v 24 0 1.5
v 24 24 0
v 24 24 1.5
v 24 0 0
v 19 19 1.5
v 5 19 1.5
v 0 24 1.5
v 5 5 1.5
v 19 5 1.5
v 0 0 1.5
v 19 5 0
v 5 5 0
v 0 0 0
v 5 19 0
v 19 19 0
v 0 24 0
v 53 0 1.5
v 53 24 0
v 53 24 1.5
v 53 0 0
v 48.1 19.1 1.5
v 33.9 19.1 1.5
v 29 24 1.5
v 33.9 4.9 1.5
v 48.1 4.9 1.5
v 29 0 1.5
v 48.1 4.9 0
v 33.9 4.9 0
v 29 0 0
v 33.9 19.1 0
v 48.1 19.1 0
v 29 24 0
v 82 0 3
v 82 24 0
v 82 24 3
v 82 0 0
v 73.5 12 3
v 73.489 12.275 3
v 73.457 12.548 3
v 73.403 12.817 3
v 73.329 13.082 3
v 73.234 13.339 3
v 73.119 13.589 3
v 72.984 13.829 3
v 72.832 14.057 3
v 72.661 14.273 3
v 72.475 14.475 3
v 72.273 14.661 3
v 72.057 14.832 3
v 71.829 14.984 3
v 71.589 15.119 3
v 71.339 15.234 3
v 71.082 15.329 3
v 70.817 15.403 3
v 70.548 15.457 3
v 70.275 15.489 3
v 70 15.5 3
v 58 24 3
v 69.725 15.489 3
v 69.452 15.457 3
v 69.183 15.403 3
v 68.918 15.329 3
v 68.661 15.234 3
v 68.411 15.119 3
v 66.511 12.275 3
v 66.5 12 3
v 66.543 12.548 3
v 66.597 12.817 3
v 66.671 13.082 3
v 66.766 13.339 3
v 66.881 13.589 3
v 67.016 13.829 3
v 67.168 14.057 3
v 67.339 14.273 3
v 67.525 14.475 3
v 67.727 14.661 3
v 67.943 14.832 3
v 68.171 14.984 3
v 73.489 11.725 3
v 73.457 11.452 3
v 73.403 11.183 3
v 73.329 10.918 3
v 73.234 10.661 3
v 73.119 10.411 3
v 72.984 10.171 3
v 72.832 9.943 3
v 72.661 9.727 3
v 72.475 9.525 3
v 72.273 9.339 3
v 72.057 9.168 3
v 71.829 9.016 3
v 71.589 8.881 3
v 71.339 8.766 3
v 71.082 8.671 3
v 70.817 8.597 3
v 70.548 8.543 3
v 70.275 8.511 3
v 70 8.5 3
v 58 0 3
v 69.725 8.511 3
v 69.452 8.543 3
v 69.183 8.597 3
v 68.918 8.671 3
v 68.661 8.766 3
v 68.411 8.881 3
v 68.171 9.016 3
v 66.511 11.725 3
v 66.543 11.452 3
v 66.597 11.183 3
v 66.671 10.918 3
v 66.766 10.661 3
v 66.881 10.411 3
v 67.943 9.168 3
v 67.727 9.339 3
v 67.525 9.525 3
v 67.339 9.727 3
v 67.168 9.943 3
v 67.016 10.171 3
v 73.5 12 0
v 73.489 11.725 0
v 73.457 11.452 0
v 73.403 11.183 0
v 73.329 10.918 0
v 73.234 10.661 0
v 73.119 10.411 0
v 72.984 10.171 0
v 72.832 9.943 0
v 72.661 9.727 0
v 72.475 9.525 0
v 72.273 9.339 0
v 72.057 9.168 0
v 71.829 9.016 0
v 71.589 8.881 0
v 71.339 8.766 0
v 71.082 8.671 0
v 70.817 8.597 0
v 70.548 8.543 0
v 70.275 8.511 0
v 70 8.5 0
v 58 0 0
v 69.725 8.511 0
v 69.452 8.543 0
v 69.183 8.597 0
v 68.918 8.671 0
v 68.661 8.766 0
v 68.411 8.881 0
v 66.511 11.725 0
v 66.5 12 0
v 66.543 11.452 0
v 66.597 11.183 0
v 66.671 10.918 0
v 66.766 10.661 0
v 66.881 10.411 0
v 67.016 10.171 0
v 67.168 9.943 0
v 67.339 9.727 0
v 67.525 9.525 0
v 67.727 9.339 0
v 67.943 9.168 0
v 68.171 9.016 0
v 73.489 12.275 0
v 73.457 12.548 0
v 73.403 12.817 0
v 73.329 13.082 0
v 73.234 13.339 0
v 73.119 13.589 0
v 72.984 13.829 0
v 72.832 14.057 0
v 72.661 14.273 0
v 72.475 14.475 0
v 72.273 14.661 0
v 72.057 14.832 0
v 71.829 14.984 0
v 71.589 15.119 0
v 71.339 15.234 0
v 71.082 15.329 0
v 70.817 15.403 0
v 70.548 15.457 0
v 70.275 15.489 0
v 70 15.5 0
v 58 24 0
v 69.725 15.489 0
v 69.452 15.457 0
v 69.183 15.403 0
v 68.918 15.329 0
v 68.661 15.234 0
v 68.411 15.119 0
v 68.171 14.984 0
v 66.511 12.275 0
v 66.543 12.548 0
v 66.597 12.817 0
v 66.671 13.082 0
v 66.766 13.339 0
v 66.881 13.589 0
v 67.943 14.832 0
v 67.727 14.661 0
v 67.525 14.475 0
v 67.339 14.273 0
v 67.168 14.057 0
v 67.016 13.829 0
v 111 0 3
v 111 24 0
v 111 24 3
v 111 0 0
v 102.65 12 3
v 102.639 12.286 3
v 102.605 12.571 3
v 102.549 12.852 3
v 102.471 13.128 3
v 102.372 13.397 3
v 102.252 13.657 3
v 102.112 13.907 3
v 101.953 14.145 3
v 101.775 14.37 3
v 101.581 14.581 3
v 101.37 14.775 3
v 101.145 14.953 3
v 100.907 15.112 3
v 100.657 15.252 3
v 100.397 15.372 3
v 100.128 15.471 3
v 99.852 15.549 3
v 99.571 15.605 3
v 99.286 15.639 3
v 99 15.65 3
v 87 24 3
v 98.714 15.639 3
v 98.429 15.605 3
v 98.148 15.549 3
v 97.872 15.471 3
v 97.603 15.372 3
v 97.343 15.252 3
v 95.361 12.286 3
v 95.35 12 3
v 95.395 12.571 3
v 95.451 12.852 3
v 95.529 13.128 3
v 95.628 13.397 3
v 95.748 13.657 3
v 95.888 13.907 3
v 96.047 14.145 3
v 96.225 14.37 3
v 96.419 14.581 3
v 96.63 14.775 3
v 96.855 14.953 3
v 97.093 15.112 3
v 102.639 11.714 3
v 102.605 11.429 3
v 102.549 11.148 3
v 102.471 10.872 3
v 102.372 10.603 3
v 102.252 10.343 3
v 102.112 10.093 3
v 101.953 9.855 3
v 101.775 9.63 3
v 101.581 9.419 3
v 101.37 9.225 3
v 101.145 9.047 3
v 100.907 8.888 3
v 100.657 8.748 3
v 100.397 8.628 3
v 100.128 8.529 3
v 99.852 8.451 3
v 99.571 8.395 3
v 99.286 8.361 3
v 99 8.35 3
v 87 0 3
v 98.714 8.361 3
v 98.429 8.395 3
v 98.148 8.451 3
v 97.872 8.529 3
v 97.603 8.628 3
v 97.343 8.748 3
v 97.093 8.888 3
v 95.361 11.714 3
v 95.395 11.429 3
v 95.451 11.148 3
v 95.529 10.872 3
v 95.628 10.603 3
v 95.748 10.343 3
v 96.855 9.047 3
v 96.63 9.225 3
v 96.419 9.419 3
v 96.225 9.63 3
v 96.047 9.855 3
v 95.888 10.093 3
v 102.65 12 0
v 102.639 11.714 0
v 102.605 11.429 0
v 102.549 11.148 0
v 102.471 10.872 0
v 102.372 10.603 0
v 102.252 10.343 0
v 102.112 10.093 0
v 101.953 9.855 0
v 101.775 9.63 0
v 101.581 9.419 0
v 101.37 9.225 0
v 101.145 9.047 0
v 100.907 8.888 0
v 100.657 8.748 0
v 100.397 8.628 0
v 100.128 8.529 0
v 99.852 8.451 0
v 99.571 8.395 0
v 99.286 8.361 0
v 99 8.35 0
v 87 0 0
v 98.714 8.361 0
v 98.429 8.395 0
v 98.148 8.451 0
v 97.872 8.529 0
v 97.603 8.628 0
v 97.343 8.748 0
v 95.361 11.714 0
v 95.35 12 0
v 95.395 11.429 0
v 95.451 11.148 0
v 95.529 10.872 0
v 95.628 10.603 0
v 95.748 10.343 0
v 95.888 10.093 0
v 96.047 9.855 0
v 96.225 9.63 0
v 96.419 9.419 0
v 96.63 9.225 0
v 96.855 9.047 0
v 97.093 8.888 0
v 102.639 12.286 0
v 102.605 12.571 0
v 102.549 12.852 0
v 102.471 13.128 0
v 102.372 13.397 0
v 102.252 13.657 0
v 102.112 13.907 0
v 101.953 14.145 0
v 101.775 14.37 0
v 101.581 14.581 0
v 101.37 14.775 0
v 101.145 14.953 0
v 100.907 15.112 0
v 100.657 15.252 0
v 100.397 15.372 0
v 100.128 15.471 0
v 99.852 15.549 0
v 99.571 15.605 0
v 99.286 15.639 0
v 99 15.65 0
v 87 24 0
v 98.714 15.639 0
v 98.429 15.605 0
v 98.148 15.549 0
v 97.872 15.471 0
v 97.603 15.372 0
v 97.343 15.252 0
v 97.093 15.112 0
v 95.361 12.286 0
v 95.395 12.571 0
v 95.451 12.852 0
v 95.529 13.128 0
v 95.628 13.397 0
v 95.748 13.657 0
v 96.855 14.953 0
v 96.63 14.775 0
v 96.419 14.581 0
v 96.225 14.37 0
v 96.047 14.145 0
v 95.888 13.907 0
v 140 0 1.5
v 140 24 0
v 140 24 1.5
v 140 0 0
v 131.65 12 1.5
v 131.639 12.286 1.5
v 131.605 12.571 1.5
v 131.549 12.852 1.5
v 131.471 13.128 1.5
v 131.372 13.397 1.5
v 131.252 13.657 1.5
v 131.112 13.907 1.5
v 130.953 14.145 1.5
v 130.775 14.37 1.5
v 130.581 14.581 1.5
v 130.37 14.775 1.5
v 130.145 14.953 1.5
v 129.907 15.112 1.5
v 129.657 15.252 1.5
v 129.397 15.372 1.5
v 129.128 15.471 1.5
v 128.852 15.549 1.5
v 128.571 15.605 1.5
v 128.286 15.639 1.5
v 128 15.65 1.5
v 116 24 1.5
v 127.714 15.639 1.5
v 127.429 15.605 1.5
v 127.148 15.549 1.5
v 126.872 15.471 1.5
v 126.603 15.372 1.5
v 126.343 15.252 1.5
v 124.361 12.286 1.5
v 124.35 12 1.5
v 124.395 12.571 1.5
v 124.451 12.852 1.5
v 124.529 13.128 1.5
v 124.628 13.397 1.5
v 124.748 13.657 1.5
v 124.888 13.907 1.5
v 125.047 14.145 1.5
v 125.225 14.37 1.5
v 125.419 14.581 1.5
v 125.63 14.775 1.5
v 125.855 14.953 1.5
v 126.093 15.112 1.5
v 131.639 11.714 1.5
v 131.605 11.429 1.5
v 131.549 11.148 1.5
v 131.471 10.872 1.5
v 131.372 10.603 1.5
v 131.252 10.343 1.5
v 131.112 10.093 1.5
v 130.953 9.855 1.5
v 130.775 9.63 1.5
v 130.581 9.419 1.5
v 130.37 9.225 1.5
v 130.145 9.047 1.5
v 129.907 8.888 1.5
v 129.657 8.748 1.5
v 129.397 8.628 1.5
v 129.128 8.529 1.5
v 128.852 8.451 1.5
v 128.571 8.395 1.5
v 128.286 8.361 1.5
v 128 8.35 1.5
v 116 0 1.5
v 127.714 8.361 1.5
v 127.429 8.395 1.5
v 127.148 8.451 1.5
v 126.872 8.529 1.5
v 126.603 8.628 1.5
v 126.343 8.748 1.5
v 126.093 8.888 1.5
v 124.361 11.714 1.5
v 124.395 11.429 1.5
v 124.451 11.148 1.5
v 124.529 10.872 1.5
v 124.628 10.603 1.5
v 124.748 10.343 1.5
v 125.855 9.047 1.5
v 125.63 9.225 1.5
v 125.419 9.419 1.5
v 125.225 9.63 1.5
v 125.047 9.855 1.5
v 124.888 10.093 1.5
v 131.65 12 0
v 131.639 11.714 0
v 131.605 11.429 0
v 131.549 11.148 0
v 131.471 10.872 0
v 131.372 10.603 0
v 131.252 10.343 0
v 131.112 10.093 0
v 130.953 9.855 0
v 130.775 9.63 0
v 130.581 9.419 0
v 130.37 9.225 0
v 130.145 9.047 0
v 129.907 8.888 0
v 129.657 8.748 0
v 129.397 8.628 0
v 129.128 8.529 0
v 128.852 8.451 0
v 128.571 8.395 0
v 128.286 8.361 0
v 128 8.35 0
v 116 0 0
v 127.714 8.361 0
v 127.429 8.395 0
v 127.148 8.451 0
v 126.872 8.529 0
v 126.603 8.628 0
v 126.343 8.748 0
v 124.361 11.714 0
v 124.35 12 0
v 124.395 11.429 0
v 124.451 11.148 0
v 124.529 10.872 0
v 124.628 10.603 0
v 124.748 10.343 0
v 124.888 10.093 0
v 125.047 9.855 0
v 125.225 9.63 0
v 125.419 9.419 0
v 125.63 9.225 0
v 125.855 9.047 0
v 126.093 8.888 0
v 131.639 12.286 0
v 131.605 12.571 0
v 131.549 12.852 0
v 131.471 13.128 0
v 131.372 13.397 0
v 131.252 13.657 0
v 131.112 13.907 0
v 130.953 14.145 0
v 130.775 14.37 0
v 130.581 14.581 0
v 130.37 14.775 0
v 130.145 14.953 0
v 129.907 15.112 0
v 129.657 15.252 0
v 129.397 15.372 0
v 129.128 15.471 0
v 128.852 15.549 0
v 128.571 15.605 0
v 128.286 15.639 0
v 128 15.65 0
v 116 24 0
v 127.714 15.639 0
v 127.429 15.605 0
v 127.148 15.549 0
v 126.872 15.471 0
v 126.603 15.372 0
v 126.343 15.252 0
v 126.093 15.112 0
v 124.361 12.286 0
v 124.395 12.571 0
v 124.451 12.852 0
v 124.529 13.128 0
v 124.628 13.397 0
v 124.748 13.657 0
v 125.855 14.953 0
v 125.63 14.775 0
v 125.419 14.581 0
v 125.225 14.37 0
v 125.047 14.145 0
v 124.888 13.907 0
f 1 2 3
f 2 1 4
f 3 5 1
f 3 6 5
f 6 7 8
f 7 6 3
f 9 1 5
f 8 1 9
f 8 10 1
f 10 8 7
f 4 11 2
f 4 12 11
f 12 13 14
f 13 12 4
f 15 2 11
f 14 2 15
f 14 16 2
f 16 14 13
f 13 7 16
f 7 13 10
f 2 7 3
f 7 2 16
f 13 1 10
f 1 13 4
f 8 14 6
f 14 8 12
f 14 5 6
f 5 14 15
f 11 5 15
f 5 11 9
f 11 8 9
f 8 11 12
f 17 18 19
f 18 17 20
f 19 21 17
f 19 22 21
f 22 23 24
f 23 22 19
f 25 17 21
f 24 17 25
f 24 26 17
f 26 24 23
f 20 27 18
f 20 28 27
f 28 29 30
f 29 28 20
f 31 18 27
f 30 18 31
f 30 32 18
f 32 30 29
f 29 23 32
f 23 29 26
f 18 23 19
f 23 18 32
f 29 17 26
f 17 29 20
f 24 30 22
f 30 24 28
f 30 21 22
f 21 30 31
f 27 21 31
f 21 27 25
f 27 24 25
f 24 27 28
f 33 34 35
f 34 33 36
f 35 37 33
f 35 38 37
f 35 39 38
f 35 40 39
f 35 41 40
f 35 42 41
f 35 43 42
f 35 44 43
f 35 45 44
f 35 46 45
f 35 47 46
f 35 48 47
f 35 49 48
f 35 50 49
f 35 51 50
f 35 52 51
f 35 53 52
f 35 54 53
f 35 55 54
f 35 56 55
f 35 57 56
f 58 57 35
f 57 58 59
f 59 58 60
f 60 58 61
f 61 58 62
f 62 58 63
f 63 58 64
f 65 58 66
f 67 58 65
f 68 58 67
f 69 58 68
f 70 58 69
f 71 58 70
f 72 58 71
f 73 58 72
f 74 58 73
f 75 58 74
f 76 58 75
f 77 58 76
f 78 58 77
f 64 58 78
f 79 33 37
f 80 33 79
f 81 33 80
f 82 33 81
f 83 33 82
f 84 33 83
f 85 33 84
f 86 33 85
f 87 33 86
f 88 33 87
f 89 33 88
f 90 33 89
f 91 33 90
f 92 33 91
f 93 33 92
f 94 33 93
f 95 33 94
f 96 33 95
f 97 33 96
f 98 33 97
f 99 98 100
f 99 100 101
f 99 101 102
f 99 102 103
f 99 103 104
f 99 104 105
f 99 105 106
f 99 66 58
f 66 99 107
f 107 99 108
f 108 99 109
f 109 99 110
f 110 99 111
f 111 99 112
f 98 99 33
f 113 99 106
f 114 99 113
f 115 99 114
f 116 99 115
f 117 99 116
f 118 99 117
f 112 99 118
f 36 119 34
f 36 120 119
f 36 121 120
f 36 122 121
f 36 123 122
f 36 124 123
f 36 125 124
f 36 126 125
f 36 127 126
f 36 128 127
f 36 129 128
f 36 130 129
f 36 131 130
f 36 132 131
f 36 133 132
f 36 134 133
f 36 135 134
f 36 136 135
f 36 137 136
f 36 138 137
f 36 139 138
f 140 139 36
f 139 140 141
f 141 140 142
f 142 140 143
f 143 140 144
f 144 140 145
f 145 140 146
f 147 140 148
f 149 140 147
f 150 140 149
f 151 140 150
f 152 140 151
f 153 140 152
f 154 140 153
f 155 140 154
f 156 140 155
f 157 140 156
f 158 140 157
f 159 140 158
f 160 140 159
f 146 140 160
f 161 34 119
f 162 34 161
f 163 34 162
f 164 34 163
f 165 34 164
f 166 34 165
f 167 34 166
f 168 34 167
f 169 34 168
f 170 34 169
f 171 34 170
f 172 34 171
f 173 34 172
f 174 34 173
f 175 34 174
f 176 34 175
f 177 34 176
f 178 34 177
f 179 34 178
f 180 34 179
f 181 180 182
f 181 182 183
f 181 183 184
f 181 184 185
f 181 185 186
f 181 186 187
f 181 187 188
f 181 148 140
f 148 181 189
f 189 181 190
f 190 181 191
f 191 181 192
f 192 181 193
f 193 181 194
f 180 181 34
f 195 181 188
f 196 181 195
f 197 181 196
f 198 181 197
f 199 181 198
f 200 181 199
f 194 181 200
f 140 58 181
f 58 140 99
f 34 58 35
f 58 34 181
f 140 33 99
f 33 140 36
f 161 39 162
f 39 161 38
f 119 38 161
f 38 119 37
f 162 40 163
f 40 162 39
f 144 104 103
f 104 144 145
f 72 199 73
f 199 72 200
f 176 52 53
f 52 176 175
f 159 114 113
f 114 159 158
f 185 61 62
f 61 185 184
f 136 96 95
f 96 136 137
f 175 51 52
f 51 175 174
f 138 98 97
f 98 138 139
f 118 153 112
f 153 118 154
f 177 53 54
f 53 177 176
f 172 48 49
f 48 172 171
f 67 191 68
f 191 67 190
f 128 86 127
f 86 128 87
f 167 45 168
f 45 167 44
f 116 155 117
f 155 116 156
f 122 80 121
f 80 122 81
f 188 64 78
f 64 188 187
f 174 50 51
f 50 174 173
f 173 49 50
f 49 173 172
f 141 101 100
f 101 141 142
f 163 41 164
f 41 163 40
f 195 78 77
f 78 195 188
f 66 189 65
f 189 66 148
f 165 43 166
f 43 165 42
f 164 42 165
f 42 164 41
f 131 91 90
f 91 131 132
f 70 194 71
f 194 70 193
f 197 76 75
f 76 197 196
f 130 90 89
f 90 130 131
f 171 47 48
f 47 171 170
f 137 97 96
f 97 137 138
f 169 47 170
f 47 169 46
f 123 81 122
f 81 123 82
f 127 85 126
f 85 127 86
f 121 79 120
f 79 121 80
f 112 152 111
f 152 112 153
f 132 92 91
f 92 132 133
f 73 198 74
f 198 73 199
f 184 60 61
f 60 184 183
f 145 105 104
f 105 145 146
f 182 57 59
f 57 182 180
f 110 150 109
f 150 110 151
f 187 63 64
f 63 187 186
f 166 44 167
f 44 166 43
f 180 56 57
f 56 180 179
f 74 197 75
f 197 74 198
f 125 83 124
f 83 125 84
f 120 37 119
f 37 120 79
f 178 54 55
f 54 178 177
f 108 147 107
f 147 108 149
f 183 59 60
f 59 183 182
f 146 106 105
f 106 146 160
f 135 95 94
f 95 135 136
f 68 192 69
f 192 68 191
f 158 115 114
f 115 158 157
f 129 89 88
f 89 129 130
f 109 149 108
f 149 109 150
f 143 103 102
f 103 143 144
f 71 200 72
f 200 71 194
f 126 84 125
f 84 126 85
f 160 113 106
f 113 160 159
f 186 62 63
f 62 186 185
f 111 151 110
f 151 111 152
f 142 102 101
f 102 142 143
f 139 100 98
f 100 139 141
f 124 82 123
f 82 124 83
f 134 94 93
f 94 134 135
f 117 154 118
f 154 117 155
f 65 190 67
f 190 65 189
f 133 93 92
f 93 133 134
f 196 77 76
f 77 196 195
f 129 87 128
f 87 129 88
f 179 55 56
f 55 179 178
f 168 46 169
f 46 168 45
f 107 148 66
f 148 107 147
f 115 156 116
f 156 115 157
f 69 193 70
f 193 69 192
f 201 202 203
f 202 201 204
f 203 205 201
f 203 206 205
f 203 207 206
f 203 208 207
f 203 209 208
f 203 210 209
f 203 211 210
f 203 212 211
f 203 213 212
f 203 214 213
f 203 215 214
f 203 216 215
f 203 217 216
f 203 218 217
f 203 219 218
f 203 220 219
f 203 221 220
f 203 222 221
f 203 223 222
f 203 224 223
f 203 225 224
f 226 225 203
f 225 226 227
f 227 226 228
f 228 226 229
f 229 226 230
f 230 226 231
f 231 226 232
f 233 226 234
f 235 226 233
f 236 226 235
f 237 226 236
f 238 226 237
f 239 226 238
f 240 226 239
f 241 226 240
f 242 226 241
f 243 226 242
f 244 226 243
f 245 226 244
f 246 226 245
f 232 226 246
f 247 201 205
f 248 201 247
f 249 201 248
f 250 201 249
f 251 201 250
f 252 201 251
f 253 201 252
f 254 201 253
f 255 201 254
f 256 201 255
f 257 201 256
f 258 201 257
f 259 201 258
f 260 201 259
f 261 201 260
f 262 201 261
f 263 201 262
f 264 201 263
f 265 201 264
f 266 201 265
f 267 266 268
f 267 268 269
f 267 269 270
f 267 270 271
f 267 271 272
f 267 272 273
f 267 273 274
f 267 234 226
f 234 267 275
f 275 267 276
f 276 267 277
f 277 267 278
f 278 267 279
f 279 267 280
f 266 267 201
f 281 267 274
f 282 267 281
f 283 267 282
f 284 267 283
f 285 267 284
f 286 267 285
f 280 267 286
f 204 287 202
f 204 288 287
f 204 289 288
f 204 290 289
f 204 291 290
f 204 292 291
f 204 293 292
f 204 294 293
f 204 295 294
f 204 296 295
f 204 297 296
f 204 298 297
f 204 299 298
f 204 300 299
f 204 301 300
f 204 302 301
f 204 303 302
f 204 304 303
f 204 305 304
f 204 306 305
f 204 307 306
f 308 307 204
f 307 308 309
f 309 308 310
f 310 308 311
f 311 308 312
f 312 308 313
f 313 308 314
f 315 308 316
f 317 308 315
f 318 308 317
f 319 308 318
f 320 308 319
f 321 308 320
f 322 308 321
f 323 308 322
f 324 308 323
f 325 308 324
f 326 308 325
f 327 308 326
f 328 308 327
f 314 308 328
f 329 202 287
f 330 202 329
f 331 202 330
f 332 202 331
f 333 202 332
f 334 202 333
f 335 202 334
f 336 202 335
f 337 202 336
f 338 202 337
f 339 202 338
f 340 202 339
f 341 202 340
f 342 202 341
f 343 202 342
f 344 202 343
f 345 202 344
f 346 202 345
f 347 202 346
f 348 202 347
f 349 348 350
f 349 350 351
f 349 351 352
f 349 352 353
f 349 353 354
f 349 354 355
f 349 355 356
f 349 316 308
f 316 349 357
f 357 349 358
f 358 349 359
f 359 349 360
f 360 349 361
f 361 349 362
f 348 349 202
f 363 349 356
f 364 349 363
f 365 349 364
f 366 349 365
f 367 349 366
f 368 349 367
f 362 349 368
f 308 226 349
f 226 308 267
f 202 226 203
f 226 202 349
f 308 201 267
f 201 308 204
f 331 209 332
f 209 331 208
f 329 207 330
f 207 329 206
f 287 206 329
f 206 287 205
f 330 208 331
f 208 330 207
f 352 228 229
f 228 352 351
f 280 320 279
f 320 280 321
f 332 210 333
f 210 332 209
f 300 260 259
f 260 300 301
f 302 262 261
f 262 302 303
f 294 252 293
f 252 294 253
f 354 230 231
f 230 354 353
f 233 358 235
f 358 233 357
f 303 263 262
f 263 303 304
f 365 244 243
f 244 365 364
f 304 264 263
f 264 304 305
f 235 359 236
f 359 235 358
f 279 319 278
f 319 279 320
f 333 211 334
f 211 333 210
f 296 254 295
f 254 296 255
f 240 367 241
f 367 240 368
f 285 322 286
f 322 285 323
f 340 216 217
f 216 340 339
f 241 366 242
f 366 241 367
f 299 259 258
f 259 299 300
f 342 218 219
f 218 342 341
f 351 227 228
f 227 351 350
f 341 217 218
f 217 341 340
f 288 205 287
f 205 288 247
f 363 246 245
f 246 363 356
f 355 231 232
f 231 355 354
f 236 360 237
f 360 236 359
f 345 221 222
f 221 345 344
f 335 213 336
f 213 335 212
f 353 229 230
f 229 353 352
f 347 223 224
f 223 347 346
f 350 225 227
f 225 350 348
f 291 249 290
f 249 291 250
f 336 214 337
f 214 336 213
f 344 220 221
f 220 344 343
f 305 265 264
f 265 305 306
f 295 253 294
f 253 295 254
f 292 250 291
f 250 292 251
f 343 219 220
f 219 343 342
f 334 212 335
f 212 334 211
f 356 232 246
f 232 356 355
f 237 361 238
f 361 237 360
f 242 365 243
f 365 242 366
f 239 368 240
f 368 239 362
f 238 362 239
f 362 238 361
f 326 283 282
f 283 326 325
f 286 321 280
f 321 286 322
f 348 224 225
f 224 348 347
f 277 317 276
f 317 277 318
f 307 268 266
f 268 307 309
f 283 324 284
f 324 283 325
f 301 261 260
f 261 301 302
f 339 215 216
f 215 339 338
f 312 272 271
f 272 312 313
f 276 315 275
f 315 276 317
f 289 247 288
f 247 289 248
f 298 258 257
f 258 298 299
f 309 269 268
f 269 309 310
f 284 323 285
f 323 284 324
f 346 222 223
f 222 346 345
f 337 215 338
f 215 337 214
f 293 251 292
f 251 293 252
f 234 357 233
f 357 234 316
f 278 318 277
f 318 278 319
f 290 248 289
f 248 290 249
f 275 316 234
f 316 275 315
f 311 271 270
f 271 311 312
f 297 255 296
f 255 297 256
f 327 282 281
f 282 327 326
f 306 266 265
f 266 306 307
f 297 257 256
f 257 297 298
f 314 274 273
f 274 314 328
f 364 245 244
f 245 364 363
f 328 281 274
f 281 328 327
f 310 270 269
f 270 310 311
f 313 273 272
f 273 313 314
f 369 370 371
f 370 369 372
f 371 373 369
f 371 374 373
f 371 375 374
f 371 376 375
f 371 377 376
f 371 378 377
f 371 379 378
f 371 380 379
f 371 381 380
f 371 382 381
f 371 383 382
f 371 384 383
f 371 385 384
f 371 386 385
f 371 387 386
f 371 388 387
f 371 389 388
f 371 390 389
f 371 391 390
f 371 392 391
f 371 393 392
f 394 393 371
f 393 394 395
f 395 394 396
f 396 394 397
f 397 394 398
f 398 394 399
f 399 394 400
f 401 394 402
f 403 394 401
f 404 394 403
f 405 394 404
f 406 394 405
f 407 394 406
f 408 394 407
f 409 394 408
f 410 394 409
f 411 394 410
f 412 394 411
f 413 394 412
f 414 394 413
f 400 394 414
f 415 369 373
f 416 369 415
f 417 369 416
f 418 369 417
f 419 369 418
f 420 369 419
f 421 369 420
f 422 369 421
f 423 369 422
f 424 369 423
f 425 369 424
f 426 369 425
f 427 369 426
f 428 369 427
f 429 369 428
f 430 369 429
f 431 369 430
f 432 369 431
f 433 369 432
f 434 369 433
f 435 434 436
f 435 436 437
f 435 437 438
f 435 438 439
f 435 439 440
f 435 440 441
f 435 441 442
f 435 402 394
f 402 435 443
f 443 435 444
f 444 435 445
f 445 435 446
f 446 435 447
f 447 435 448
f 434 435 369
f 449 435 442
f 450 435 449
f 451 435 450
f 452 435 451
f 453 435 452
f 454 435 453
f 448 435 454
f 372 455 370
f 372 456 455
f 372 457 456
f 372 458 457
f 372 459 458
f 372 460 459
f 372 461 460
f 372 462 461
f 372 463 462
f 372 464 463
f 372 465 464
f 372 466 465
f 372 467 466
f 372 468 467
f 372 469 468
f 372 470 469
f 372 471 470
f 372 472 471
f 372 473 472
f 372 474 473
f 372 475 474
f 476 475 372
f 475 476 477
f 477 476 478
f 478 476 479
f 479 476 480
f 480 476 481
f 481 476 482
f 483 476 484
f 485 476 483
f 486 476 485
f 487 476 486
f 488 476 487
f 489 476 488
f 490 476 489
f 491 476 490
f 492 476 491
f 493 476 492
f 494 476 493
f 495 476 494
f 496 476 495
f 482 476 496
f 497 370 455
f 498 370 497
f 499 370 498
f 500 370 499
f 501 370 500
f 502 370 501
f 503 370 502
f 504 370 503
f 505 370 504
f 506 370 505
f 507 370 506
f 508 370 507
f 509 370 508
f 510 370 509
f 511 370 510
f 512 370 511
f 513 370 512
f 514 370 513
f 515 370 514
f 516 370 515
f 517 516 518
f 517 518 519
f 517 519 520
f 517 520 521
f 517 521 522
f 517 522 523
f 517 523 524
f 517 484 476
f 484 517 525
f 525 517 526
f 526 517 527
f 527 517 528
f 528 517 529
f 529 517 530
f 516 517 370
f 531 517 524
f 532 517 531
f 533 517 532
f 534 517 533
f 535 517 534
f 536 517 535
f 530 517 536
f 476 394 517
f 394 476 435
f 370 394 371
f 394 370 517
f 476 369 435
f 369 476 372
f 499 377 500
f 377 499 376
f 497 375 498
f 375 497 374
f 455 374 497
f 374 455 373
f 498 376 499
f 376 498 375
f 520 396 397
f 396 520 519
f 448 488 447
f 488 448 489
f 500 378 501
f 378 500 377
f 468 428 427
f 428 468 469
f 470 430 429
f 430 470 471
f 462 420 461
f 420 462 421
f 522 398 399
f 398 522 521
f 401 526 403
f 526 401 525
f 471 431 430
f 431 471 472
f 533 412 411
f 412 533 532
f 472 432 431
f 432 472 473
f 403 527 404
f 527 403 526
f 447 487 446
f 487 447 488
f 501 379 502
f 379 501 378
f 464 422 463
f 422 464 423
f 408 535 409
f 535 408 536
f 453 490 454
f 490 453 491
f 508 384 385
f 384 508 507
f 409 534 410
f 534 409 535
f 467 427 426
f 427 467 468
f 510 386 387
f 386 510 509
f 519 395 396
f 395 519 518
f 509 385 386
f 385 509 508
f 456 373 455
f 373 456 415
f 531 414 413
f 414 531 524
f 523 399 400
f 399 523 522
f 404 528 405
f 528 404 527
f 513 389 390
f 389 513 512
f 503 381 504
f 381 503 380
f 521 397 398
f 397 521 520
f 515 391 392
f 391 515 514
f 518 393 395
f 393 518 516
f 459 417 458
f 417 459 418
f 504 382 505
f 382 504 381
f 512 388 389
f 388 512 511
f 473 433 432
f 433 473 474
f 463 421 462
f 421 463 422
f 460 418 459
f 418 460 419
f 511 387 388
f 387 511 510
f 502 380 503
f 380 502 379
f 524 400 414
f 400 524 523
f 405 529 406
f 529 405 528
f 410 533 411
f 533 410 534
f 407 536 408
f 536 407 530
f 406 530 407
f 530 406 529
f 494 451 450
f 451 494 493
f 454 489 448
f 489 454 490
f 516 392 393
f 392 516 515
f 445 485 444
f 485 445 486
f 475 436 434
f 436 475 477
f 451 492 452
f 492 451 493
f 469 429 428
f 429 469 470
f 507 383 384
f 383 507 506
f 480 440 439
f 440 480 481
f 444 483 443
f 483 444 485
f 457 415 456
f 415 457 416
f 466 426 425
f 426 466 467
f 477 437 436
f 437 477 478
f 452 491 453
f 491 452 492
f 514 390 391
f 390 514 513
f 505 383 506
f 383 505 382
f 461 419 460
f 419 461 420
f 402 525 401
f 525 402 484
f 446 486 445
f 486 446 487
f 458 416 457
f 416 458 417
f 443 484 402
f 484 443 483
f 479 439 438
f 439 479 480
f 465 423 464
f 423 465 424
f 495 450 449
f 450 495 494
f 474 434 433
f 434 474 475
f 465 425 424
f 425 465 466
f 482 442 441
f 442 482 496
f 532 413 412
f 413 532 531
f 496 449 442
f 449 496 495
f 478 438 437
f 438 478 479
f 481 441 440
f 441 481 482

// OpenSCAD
/* Rev B component-mount fit coupons; NOT a finished enclosure or switch specification.
   Print five separate 24 x 24 mm coupons in left-to-right order.
   #1 MX 14.0mm nominal square, 1.5mm thick
   #2 MX 14.2mm trial square, 1.5mm thick
   #3 encoder dia 7.0mm, 3.0mm panel
   #4 encoder dia 7.3mm, 3.0mm panel
   #5 encoder dia 7.3mm, 1.5mm panel
   All tolerances approximate; test with the exact owned MX and Adafruit PID 377.
   Check snap engagement, nut/washer support, grub screw and push-click travel.
*/
$fn=80;
tile=24;
pitch=29;

module mx_cutout(cut=14.0,thick=1.5) {
    difference() {
        cube([tile,tile,thick]);
        translate([tile/2,tile/2,-0.5])
            linear_extrude(thick+1) square([cut,cut],center=true);
    }
}

module encoder_cutout(bore=7.3,thick=3) {
    difference() {
        cube([tile,tile,thick]);
        translate([tile/2,tile/2,-0.5]) cylinder(d=bore,h=thick+1);
    }
}

translate([0*pitch,0,0]) mx_cutout(14.0,1.5);
translate([1*pitch,0,0]) mx_cutout(14.2,1.5);
translate([2*pitch,0,0]) encoder_cutout(7.0,3.0);
translate([3*pitch,0,0]) encoder_cutout(7.3,3.0);
translate([4*pitch,0,0]) encoder_cutout(7.3,1.5);
